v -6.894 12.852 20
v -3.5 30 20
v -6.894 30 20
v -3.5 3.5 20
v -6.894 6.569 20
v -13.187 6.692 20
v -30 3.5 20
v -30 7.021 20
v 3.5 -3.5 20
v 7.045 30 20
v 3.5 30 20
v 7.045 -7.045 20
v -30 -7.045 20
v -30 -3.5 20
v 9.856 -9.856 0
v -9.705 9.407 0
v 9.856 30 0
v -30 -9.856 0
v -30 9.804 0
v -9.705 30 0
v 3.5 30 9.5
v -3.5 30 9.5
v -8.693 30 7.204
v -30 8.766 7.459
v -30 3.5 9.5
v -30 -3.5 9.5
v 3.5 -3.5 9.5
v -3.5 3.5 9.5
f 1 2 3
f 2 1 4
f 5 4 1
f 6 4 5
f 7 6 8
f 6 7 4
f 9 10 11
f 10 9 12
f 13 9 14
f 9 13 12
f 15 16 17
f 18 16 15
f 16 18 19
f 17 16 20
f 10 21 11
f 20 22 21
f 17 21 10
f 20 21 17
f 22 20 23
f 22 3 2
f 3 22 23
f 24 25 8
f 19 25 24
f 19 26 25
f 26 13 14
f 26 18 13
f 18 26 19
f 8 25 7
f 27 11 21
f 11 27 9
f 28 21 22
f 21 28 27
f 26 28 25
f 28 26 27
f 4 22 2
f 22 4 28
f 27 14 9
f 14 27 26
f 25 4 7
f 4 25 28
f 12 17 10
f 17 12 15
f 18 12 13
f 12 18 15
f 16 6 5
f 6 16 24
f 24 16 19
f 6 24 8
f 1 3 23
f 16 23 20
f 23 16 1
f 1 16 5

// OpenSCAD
height=20;
width=20;
length=40;
bezel_angle=8;
h_bezel=1.5*height;
w_channel=7;

STRAIGHT_PIECE=1;
CORNER_PIECE=2;

piece=CORNER_PIECE;

if( piece == STRAIGHT_PIECE ) {
    straight_support();
}
if( piece == CORNER_PIECE ) {
    corner_support();
}

module straight_support() {
    difference() {
        block();
        channel();
        outer_bezel();
        rotate(a=[0,0,180]) outer_bezel();
    }
}

module corner_support() {
    channel_offset=width/2+w_channel;
    difference() {
        union() {
            translate([0,width/2,0]) block();    
            rotate([0,0,90]) translate([0,width/2,0]) block();    
        }

        // channel
        translate([0,channel_offset,0]) channel();
        rotate([0,0,90]) translate([0,channel_offset,0]) channel();

        // outside bezel
        translate([0,width/2,0]) outer_bezel();
        rotate([0,0,-90]) translate([0,-width/2,0]) outer_bezel();

        // inside bezel
        translate([-(h_bezel+width/2),width/2,0]) rotate([bezel_angle,bezel_angle,0]) cube( [h_bezel,h_bezel,h_bezel], center=false );
    }
}

module block() {
    translate([0,0,height/2]) cube( [width,length,height], center=true );    
}

module channel() {
     translate([0,0,0.75*height]) cube( [ w_channel,length+1,height/2+1], center=true );
}

module outer_bezel() {
    bezel_offset=(width+w_channel)/2;
    translate([bezel_offset,0,height/2])  rotate([0,-bezel_angle,0]) cube( [width/2,length+1,h_bezel], center=true );
}
